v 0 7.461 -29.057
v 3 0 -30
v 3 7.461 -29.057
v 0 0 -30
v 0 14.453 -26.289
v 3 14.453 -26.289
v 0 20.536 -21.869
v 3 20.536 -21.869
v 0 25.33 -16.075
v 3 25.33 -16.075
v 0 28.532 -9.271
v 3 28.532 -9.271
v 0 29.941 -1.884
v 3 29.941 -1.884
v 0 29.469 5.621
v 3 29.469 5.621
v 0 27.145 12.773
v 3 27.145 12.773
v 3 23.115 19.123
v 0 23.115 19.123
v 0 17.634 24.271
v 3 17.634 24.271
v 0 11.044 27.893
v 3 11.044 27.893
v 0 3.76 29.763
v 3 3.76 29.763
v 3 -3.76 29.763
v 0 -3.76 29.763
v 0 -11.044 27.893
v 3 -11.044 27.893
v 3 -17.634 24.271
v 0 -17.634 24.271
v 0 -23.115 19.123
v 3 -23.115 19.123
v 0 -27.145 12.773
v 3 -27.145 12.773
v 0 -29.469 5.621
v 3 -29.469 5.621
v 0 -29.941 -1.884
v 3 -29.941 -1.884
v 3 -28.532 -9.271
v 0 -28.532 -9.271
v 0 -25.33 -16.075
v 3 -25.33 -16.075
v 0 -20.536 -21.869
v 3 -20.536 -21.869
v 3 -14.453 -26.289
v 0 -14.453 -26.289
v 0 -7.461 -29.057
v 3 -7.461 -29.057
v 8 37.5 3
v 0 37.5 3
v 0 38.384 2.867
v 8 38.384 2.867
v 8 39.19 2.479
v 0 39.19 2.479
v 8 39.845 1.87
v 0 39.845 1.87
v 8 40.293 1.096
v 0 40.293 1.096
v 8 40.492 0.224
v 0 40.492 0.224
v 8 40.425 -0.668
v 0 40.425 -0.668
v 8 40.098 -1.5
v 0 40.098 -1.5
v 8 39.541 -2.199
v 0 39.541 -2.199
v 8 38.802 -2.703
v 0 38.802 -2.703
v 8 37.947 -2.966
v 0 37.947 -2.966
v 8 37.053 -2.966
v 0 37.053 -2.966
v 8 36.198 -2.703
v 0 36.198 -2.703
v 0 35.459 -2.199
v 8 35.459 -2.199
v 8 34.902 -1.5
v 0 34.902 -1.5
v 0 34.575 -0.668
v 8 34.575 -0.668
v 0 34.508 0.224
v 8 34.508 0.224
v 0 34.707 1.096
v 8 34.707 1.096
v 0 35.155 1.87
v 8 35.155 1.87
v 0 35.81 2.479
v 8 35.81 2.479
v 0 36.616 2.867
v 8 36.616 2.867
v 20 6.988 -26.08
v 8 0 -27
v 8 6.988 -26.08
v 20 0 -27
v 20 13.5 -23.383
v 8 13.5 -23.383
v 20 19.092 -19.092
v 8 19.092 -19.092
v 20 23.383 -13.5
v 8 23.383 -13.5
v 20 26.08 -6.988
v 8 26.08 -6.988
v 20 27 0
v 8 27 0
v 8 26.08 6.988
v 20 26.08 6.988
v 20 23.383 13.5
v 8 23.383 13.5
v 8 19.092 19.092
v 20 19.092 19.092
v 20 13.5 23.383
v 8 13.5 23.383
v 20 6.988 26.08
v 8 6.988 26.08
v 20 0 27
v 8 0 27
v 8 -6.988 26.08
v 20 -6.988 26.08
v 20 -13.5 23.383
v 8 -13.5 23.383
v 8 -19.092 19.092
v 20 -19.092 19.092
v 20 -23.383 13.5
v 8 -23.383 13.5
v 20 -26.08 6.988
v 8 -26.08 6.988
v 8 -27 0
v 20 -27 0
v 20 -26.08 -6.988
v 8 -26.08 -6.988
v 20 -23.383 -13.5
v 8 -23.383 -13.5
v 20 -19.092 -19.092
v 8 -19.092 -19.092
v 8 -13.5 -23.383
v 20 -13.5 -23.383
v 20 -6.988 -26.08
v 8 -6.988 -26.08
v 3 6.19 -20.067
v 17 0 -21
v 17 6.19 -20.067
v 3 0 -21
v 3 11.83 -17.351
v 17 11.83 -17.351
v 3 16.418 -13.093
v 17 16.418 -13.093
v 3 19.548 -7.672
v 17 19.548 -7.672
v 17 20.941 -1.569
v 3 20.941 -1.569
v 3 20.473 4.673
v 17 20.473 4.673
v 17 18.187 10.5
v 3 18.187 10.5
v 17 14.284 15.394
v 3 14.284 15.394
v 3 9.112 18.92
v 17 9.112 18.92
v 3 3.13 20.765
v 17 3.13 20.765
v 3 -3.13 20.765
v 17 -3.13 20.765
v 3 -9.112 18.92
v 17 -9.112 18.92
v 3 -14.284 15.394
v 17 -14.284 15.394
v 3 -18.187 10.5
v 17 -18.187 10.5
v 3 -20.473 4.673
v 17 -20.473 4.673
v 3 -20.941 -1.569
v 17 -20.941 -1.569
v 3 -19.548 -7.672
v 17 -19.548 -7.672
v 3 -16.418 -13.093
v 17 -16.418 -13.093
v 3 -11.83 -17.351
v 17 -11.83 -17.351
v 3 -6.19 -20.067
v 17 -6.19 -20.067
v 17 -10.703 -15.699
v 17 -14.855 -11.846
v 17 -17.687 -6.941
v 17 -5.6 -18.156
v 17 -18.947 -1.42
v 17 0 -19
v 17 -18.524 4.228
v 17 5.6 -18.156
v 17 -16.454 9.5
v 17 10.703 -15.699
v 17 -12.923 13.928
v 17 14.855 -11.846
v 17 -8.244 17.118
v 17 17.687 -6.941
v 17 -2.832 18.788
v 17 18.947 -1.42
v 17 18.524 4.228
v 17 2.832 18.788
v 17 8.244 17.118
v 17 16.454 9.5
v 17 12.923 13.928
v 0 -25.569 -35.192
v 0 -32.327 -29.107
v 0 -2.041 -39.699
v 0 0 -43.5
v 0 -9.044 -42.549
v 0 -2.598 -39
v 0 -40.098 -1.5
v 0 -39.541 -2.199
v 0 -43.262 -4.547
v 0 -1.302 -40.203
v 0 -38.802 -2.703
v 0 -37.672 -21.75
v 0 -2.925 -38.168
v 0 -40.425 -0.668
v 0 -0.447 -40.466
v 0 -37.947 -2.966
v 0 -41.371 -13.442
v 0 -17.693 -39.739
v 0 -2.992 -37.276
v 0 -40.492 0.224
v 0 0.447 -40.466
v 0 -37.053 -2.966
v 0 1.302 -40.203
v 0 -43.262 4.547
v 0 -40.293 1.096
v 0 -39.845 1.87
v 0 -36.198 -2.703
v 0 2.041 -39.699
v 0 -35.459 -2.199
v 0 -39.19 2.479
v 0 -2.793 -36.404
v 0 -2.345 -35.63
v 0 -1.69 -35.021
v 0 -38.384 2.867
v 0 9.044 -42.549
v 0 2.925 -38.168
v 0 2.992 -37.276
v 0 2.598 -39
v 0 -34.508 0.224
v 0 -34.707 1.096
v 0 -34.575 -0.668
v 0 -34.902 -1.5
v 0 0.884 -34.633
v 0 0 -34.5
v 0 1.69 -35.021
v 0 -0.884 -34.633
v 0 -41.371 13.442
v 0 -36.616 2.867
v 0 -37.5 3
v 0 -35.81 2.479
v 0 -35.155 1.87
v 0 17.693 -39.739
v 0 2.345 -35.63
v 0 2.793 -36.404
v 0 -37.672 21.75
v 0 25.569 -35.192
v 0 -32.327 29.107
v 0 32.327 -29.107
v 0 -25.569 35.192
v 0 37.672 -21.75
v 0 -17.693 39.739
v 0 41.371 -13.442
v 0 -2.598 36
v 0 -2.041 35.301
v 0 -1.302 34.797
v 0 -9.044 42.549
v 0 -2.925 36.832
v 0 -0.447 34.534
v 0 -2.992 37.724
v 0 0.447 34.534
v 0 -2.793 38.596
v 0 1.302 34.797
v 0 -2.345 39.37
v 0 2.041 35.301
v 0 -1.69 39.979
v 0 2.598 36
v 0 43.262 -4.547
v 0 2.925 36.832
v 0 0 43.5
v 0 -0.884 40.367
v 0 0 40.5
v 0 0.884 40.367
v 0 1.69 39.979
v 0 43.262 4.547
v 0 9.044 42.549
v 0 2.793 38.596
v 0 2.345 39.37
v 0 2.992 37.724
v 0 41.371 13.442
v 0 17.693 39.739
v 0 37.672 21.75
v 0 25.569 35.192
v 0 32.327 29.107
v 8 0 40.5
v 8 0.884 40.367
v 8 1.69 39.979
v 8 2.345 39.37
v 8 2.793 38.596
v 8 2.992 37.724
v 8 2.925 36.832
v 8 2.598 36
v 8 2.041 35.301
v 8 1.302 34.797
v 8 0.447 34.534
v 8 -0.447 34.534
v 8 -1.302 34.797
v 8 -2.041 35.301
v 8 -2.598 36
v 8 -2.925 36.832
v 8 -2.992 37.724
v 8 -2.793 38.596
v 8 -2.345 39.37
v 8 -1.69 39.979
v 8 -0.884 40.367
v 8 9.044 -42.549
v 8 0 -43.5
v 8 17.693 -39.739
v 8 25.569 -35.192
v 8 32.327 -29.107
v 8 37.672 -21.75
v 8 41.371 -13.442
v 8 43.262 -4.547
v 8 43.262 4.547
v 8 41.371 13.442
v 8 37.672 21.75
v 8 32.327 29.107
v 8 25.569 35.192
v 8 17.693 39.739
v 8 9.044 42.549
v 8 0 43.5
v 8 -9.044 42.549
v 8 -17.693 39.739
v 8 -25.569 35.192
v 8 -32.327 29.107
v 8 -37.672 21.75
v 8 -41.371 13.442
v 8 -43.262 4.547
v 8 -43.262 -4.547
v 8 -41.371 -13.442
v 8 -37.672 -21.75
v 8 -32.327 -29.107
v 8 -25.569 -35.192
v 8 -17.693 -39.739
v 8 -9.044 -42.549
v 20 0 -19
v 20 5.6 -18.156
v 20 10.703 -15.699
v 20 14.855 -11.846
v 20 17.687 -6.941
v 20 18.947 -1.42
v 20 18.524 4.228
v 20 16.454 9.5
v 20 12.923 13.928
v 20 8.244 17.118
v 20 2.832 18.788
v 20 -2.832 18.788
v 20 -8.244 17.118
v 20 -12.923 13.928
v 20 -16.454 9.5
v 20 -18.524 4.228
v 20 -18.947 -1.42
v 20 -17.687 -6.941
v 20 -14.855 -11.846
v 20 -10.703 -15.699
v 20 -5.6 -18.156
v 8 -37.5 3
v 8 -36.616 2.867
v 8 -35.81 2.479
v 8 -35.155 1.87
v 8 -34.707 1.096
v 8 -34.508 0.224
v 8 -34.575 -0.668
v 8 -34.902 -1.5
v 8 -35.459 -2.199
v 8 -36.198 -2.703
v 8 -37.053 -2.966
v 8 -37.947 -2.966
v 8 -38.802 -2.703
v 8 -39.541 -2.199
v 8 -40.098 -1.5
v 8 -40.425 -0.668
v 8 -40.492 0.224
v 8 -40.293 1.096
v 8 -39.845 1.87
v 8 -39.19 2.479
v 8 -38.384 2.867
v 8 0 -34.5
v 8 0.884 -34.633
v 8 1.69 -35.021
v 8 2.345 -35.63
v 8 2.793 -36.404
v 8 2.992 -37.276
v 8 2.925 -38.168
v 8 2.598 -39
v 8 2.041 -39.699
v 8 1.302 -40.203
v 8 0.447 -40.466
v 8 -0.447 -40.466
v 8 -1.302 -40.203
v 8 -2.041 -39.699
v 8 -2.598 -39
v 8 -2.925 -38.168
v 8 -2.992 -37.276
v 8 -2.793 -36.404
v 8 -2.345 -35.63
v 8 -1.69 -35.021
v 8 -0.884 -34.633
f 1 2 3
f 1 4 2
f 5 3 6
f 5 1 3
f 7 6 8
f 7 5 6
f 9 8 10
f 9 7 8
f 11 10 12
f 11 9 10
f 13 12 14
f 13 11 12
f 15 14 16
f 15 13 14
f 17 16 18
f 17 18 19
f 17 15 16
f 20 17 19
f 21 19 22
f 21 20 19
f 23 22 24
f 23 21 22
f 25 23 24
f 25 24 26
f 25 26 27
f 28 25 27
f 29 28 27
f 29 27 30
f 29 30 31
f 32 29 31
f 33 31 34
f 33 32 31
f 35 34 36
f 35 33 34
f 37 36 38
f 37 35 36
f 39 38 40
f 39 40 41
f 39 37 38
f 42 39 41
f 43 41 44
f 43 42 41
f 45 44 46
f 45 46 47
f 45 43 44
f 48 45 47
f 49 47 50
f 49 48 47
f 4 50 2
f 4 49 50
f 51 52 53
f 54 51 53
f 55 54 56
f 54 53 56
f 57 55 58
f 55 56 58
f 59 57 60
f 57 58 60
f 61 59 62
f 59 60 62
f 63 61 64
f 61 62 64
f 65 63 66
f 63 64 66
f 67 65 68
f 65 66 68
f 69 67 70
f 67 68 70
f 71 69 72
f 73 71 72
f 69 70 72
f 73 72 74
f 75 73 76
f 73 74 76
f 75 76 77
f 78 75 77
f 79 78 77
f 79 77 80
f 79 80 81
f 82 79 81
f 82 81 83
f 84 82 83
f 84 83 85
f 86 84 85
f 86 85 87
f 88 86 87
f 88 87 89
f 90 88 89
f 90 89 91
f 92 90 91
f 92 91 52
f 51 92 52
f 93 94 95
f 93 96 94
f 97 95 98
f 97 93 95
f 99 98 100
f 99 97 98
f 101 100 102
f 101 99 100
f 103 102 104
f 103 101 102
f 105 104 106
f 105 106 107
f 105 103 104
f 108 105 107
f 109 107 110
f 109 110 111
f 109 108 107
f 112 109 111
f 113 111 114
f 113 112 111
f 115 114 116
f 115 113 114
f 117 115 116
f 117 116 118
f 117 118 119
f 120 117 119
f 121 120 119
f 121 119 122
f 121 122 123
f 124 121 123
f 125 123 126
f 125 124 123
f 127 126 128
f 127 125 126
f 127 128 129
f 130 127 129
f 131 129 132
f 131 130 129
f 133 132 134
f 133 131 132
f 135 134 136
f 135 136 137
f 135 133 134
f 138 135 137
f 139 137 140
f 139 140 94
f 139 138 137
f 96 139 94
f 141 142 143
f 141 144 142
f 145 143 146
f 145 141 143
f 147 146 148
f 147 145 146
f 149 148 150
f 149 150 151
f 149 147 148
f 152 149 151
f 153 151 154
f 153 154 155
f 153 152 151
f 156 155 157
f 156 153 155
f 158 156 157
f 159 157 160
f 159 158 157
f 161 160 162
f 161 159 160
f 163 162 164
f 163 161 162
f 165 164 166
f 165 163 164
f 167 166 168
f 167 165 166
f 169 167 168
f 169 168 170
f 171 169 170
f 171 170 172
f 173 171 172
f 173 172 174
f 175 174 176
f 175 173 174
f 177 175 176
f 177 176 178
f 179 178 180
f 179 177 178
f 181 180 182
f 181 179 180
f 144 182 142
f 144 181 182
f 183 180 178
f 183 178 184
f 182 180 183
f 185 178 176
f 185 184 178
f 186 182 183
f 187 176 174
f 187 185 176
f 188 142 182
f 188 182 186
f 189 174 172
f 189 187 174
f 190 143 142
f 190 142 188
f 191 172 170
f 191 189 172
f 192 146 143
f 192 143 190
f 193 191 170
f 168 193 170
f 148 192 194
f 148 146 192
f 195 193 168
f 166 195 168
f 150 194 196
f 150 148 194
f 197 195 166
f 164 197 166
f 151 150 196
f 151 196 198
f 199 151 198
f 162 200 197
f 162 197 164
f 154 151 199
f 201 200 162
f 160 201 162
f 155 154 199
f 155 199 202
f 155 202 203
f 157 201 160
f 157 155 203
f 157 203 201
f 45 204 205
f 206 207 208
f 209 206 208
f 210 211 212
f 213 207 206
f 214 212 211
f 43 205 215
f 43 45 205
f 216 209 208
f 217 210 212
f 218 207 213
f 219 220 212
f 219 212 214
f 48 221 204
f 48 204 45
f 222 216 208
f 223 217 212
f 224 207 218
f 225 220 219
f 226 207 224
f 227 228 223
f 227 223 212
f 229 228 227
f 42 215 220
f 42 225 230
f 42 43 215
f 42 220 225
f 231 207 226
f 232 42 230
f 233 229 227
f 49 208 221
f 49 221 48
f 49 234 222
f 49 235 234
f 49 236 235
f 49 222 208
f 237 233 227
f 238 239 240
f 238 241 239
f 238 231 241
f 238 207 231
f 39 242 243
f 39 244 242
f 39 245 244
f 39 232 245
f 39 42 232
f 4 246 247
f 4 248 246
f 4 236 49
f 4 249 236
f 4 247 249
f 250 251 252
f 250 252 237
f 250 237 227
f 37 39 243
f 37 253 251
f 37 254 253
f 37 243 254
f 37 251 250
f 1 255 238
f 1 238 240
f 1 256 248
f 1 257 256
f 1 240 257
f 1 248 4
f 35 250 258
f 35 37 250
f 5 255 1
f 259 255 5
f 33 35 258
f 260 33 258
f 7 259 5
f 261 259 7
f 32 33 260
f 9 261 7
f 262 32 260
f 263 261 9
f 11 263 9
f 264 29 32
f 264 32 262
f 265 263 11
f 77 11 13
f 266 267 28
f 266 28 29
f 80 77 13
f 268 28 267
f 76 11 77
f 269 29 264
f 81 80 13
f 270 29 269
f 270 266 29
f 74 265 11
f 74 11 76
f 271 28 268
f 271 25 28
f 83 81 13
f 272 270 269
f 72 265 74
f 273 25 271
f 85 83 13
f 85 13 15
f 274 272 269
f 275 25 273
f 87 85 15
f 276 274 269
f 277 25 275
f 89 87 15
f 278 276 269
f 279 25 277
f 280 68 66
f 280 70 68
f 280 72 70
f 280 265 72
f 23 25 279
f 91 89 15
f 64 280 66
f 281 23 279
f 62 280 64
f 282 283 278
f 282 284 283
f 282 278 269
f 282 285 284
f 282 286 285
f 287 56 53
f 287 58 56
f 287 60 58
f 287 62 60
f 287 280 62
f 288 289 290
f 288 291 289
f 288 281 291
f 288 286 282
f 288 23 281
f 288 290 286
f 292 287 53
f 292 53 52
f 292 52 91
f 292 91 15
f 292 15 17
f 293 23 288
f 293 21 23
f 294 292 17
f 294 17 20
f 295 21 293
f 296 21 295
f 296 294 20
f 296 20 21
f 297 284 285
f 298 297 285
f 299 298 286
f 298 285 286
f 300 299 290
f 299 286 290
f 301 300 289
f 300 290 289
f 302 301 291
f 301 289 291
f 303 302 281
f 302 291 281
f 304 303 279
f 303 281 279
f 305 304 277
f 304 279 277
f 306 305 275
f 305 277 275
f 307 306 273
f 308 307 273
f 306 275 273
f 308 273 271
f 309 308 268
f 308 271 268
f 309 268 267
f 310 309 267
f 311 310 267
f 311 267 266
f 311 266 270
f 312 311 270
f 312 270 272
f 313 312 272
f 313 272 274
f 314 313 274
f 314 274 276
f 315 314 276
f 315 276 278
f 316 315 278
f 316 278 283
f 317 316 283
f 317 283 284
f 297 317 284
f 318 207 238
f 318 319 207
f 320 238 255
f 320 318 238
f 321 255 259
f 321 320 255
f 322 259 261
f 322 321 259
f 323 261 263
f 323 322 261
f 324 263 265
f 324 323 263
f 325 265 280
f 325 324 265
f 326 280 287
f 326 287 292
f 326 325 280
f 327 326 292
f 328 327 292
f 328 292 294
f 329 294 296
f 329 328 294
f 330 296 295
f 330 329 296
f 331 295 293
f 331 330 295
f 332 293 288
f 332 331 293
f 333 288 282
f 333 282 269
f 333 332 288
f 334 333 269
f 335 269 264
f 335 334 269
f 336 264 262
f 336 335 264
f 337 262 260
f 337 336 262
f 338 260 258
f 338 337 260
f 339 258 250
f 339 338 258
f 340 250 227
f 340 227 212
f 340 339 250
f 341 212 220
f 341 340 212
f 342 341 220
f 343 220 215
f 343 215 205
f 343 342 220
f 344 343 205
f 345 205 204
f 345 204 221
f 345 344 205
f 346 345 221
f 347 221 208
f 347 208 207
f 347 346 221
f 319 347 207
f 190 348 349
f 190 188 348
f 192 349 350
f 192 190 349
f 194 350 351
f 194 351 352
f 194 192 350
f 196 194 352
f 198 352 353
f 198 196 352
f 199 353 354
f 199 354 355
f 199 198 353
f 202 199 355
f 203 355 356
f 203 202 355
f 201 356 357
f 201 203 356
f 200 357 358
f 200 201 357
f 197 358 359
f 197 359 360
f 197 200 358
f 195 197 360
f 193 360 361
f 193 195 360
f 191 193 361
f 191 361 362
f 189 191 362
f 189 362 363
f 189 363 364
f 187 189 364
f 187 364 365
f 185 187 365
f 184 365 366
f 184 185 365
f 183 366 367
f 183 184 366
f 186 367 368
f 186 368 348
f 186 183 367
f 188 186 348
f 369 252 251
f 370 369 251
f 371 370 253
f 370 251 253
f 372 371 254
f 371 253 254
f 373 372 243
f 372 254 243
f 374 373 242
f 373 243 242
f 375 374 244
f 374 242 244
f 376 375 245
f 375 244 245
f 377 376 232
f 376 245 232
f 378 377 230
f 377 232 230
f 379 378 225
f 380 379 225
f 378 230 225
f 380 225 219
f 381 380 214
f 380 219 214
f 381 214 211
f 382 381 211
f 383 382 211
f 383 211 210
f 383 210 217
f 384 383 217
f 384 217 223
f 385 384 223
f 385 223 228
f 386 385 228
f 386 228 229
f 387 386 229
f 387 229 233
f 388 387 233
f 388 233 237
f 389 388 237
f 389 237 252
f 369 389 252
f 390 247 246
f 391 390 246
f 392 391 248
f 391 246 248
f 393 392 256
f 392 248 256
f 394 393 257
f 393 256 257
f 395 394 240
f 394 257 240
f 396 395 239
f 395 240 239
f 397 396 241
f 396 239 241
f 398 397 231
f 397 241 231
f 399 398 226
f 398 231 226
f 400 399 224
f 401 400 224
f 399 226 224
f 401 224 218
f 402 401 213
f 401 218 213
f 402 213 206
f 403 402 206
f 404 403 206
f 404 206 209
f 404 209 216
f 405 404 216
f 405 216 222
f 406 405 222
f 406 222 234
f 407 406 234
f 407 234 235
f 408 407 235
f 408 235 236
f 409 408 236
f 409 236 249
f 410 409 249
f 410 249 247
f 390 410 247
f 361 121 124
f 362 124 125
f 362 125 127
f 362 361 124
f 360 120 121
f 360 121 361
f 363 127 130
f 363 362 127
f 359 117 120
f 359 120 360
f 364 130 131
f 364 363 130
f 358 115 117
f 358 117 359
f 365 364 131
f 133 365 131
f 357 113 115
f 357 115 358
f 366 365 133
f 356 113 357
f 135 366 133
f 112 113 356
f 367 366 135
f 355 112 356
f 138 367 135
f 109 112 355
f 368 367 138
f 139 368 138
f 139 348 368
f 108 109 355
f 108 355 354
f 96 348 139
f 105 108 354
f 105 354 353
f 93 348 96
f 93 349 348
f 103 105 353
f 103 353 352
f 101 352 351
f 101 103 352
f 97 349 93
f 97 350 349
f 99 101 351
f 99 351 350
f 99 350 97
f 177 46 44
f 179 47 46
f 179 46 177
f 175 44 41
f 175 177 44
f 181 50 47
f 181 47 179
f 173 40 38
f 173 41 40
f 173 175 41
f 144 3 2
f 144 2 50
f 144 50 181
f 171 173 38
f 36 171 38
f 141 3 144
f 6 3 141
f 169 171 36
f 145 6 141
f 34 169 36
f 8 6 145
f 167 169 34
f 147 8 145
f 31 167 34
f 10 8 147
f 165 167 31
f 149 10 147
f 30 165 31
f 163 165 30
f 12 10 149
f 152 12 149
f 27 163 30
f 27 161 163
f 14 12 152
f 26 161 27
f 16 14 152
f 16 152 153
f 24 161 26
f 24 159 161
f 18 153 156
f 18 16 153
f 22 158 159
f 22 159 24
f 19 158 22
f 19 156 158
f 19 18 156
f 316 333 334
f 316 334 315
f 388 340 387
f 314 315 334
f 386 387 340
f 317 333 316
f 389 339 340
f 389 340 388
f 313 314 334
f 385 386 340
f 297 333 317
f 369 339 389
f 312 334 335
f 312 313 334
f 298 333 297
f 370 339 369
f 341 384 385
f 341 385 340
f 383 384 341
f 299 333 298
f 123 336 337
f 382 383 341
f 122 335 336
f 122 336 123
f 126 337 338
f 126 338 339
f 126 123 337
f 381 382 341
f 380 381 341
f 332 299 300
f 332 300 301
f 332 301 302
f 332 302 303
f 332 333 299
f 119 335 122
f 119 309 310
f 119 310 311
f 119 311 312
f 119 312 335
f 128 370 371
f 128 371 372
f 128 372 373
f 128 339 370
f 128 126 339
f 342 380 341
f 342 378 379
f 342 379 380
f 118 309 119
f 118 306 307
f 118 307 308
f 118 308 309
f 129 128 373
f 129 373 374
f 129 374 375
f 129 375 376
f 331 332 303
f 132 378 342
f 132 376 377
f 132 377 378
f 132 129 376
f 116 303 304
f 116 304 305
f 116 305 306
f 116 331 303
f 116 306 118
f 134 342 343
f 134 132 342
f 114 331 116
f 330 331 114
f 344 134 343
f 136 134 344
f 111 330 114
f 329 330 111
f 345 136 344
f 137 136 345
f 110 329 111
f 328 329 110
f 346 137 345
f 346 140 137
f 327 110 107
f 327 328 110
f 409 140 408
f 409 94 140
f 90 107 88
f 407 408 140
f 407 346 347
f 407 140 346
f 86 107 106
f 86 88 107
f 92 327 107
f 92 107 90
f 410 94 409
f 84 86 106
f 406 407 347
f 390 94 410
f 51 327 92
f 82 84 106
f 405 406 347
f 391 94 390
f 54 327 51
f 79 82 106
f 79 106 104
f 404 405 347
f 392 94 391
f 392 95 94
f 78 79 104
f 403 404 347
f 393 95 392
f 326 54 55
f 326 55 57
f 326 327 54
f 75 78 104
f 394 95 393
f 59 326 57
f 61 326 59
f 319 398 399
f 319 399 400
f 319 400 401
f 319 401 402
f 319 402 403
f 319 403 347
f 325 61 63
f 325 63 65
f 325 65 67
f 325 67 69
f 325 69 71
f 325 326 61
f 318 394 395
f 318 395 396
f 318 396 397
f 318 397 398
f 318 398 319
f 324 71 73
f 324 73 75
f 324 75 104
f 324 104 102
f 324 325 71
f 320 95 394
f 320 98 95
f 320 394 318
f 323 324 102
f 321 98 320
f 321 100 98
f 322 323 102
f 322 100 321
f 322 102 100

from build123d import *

# Parameters (mm, degrees)
CUT_EXTRUDE_1_REACH = 22
SKETCH_2_R          = 3


with BuildPart() as part:
    # 草图1 → 旋转1 (revolve)
    with BuildSketch(Plane(origin=(0, 0, 0), x_dir=(1, 0, 0), z_dir=(0, 1, 0))):
        Polygon((0, 30), (0, 43.5), (8, 43.5), (8, 27), (20, 27), (20, 19), (17, 19), (17, 21), (3, 21), (3, 30), align=None)
    revolve(axis=Axis((0, 0, 0), (1, 0, 0)))

    # 草图2 → 切除-拉伸1 (cut, up to next)
    with BuildSketch(Plane.ZY, mode=Mode.PRIVATE) as cut_extrude_1_sk1:
        with Locations((0, -37.5)):
            Circle(SKETCH_2_R)
    cut_extrude_1_tool1 = extrude(cut_extrude_1_sk1.sketch, amount=-CUT_EXTRUDE_1_REACH, mode=Mode.PRIVATE) & part.part
    add(cut_extrude_1_tool1.solids().sort_by_distance((0, -37.5, 0))[0], mode=Mode.SUBTRACT)
    # 草图2 → 切除-拉伸1 (cut, up to next)
    with BuildSketch(Plane.ZY, mode=Mode.PRIVATE) as cut_extrude_1_sk2:
        with Locations((0, 37.5)):
            Circle(SKETCH_2_R)
    cut_extrude_1_tool2 = extrude(cut_extrude_1_sk2.sketch, amount=-CUT_EXTRUDE_1_REACH, mode=Mode.PRIVATE) & part.part
    add(cut_extrude_1_tool2.solids().sort_by_distance((0, 37.5, 0))[0], mode=Mode.SUBTRACT)
    # 草图2 → 切除-拉伸1 (cut, up to next)
    with BuildSketch(Plane.ZY, mode=Mode.PRIVATE) as cut_extrude_1_sk3:
        with Locations((-37.5, 0)):
            Circle(SKETCH_2_R)
    cut_extrude_1_tool3 = extrude(cut_extrude_1_sk3.sketch, amount=-CUT_EXTRUDE_1_REACH, mode=Mode.PRIVATE) & part.part
    add(cut_extrude_1_tool3.solids().sort_by_distance((0, 0, -37.5))[0], mode=Mode.SUBTRACT)
    # 草图2 → 切除-拉伸1 (cut, up to next)
    with BuildSketch(Plane.ZY, mode=Mode.PRIVATE) as cut_extrude_1_sk4:
        with Locations((37.5, 0)):
            Circle(SKETCH_2_R)
    cut_extrude_1_tool4 = extrude(cut_extrude_1_sk4.sketch, amount=-CUT_EXTRUDE_1_REACH, mode=Mode.PRIVATE) & part.part
    add(cut_extrude_1_tool4.solids().sort_by_distance((0, 0, 37.5))[0], mode=Mode.SUBTRACT)


solid = part.part
